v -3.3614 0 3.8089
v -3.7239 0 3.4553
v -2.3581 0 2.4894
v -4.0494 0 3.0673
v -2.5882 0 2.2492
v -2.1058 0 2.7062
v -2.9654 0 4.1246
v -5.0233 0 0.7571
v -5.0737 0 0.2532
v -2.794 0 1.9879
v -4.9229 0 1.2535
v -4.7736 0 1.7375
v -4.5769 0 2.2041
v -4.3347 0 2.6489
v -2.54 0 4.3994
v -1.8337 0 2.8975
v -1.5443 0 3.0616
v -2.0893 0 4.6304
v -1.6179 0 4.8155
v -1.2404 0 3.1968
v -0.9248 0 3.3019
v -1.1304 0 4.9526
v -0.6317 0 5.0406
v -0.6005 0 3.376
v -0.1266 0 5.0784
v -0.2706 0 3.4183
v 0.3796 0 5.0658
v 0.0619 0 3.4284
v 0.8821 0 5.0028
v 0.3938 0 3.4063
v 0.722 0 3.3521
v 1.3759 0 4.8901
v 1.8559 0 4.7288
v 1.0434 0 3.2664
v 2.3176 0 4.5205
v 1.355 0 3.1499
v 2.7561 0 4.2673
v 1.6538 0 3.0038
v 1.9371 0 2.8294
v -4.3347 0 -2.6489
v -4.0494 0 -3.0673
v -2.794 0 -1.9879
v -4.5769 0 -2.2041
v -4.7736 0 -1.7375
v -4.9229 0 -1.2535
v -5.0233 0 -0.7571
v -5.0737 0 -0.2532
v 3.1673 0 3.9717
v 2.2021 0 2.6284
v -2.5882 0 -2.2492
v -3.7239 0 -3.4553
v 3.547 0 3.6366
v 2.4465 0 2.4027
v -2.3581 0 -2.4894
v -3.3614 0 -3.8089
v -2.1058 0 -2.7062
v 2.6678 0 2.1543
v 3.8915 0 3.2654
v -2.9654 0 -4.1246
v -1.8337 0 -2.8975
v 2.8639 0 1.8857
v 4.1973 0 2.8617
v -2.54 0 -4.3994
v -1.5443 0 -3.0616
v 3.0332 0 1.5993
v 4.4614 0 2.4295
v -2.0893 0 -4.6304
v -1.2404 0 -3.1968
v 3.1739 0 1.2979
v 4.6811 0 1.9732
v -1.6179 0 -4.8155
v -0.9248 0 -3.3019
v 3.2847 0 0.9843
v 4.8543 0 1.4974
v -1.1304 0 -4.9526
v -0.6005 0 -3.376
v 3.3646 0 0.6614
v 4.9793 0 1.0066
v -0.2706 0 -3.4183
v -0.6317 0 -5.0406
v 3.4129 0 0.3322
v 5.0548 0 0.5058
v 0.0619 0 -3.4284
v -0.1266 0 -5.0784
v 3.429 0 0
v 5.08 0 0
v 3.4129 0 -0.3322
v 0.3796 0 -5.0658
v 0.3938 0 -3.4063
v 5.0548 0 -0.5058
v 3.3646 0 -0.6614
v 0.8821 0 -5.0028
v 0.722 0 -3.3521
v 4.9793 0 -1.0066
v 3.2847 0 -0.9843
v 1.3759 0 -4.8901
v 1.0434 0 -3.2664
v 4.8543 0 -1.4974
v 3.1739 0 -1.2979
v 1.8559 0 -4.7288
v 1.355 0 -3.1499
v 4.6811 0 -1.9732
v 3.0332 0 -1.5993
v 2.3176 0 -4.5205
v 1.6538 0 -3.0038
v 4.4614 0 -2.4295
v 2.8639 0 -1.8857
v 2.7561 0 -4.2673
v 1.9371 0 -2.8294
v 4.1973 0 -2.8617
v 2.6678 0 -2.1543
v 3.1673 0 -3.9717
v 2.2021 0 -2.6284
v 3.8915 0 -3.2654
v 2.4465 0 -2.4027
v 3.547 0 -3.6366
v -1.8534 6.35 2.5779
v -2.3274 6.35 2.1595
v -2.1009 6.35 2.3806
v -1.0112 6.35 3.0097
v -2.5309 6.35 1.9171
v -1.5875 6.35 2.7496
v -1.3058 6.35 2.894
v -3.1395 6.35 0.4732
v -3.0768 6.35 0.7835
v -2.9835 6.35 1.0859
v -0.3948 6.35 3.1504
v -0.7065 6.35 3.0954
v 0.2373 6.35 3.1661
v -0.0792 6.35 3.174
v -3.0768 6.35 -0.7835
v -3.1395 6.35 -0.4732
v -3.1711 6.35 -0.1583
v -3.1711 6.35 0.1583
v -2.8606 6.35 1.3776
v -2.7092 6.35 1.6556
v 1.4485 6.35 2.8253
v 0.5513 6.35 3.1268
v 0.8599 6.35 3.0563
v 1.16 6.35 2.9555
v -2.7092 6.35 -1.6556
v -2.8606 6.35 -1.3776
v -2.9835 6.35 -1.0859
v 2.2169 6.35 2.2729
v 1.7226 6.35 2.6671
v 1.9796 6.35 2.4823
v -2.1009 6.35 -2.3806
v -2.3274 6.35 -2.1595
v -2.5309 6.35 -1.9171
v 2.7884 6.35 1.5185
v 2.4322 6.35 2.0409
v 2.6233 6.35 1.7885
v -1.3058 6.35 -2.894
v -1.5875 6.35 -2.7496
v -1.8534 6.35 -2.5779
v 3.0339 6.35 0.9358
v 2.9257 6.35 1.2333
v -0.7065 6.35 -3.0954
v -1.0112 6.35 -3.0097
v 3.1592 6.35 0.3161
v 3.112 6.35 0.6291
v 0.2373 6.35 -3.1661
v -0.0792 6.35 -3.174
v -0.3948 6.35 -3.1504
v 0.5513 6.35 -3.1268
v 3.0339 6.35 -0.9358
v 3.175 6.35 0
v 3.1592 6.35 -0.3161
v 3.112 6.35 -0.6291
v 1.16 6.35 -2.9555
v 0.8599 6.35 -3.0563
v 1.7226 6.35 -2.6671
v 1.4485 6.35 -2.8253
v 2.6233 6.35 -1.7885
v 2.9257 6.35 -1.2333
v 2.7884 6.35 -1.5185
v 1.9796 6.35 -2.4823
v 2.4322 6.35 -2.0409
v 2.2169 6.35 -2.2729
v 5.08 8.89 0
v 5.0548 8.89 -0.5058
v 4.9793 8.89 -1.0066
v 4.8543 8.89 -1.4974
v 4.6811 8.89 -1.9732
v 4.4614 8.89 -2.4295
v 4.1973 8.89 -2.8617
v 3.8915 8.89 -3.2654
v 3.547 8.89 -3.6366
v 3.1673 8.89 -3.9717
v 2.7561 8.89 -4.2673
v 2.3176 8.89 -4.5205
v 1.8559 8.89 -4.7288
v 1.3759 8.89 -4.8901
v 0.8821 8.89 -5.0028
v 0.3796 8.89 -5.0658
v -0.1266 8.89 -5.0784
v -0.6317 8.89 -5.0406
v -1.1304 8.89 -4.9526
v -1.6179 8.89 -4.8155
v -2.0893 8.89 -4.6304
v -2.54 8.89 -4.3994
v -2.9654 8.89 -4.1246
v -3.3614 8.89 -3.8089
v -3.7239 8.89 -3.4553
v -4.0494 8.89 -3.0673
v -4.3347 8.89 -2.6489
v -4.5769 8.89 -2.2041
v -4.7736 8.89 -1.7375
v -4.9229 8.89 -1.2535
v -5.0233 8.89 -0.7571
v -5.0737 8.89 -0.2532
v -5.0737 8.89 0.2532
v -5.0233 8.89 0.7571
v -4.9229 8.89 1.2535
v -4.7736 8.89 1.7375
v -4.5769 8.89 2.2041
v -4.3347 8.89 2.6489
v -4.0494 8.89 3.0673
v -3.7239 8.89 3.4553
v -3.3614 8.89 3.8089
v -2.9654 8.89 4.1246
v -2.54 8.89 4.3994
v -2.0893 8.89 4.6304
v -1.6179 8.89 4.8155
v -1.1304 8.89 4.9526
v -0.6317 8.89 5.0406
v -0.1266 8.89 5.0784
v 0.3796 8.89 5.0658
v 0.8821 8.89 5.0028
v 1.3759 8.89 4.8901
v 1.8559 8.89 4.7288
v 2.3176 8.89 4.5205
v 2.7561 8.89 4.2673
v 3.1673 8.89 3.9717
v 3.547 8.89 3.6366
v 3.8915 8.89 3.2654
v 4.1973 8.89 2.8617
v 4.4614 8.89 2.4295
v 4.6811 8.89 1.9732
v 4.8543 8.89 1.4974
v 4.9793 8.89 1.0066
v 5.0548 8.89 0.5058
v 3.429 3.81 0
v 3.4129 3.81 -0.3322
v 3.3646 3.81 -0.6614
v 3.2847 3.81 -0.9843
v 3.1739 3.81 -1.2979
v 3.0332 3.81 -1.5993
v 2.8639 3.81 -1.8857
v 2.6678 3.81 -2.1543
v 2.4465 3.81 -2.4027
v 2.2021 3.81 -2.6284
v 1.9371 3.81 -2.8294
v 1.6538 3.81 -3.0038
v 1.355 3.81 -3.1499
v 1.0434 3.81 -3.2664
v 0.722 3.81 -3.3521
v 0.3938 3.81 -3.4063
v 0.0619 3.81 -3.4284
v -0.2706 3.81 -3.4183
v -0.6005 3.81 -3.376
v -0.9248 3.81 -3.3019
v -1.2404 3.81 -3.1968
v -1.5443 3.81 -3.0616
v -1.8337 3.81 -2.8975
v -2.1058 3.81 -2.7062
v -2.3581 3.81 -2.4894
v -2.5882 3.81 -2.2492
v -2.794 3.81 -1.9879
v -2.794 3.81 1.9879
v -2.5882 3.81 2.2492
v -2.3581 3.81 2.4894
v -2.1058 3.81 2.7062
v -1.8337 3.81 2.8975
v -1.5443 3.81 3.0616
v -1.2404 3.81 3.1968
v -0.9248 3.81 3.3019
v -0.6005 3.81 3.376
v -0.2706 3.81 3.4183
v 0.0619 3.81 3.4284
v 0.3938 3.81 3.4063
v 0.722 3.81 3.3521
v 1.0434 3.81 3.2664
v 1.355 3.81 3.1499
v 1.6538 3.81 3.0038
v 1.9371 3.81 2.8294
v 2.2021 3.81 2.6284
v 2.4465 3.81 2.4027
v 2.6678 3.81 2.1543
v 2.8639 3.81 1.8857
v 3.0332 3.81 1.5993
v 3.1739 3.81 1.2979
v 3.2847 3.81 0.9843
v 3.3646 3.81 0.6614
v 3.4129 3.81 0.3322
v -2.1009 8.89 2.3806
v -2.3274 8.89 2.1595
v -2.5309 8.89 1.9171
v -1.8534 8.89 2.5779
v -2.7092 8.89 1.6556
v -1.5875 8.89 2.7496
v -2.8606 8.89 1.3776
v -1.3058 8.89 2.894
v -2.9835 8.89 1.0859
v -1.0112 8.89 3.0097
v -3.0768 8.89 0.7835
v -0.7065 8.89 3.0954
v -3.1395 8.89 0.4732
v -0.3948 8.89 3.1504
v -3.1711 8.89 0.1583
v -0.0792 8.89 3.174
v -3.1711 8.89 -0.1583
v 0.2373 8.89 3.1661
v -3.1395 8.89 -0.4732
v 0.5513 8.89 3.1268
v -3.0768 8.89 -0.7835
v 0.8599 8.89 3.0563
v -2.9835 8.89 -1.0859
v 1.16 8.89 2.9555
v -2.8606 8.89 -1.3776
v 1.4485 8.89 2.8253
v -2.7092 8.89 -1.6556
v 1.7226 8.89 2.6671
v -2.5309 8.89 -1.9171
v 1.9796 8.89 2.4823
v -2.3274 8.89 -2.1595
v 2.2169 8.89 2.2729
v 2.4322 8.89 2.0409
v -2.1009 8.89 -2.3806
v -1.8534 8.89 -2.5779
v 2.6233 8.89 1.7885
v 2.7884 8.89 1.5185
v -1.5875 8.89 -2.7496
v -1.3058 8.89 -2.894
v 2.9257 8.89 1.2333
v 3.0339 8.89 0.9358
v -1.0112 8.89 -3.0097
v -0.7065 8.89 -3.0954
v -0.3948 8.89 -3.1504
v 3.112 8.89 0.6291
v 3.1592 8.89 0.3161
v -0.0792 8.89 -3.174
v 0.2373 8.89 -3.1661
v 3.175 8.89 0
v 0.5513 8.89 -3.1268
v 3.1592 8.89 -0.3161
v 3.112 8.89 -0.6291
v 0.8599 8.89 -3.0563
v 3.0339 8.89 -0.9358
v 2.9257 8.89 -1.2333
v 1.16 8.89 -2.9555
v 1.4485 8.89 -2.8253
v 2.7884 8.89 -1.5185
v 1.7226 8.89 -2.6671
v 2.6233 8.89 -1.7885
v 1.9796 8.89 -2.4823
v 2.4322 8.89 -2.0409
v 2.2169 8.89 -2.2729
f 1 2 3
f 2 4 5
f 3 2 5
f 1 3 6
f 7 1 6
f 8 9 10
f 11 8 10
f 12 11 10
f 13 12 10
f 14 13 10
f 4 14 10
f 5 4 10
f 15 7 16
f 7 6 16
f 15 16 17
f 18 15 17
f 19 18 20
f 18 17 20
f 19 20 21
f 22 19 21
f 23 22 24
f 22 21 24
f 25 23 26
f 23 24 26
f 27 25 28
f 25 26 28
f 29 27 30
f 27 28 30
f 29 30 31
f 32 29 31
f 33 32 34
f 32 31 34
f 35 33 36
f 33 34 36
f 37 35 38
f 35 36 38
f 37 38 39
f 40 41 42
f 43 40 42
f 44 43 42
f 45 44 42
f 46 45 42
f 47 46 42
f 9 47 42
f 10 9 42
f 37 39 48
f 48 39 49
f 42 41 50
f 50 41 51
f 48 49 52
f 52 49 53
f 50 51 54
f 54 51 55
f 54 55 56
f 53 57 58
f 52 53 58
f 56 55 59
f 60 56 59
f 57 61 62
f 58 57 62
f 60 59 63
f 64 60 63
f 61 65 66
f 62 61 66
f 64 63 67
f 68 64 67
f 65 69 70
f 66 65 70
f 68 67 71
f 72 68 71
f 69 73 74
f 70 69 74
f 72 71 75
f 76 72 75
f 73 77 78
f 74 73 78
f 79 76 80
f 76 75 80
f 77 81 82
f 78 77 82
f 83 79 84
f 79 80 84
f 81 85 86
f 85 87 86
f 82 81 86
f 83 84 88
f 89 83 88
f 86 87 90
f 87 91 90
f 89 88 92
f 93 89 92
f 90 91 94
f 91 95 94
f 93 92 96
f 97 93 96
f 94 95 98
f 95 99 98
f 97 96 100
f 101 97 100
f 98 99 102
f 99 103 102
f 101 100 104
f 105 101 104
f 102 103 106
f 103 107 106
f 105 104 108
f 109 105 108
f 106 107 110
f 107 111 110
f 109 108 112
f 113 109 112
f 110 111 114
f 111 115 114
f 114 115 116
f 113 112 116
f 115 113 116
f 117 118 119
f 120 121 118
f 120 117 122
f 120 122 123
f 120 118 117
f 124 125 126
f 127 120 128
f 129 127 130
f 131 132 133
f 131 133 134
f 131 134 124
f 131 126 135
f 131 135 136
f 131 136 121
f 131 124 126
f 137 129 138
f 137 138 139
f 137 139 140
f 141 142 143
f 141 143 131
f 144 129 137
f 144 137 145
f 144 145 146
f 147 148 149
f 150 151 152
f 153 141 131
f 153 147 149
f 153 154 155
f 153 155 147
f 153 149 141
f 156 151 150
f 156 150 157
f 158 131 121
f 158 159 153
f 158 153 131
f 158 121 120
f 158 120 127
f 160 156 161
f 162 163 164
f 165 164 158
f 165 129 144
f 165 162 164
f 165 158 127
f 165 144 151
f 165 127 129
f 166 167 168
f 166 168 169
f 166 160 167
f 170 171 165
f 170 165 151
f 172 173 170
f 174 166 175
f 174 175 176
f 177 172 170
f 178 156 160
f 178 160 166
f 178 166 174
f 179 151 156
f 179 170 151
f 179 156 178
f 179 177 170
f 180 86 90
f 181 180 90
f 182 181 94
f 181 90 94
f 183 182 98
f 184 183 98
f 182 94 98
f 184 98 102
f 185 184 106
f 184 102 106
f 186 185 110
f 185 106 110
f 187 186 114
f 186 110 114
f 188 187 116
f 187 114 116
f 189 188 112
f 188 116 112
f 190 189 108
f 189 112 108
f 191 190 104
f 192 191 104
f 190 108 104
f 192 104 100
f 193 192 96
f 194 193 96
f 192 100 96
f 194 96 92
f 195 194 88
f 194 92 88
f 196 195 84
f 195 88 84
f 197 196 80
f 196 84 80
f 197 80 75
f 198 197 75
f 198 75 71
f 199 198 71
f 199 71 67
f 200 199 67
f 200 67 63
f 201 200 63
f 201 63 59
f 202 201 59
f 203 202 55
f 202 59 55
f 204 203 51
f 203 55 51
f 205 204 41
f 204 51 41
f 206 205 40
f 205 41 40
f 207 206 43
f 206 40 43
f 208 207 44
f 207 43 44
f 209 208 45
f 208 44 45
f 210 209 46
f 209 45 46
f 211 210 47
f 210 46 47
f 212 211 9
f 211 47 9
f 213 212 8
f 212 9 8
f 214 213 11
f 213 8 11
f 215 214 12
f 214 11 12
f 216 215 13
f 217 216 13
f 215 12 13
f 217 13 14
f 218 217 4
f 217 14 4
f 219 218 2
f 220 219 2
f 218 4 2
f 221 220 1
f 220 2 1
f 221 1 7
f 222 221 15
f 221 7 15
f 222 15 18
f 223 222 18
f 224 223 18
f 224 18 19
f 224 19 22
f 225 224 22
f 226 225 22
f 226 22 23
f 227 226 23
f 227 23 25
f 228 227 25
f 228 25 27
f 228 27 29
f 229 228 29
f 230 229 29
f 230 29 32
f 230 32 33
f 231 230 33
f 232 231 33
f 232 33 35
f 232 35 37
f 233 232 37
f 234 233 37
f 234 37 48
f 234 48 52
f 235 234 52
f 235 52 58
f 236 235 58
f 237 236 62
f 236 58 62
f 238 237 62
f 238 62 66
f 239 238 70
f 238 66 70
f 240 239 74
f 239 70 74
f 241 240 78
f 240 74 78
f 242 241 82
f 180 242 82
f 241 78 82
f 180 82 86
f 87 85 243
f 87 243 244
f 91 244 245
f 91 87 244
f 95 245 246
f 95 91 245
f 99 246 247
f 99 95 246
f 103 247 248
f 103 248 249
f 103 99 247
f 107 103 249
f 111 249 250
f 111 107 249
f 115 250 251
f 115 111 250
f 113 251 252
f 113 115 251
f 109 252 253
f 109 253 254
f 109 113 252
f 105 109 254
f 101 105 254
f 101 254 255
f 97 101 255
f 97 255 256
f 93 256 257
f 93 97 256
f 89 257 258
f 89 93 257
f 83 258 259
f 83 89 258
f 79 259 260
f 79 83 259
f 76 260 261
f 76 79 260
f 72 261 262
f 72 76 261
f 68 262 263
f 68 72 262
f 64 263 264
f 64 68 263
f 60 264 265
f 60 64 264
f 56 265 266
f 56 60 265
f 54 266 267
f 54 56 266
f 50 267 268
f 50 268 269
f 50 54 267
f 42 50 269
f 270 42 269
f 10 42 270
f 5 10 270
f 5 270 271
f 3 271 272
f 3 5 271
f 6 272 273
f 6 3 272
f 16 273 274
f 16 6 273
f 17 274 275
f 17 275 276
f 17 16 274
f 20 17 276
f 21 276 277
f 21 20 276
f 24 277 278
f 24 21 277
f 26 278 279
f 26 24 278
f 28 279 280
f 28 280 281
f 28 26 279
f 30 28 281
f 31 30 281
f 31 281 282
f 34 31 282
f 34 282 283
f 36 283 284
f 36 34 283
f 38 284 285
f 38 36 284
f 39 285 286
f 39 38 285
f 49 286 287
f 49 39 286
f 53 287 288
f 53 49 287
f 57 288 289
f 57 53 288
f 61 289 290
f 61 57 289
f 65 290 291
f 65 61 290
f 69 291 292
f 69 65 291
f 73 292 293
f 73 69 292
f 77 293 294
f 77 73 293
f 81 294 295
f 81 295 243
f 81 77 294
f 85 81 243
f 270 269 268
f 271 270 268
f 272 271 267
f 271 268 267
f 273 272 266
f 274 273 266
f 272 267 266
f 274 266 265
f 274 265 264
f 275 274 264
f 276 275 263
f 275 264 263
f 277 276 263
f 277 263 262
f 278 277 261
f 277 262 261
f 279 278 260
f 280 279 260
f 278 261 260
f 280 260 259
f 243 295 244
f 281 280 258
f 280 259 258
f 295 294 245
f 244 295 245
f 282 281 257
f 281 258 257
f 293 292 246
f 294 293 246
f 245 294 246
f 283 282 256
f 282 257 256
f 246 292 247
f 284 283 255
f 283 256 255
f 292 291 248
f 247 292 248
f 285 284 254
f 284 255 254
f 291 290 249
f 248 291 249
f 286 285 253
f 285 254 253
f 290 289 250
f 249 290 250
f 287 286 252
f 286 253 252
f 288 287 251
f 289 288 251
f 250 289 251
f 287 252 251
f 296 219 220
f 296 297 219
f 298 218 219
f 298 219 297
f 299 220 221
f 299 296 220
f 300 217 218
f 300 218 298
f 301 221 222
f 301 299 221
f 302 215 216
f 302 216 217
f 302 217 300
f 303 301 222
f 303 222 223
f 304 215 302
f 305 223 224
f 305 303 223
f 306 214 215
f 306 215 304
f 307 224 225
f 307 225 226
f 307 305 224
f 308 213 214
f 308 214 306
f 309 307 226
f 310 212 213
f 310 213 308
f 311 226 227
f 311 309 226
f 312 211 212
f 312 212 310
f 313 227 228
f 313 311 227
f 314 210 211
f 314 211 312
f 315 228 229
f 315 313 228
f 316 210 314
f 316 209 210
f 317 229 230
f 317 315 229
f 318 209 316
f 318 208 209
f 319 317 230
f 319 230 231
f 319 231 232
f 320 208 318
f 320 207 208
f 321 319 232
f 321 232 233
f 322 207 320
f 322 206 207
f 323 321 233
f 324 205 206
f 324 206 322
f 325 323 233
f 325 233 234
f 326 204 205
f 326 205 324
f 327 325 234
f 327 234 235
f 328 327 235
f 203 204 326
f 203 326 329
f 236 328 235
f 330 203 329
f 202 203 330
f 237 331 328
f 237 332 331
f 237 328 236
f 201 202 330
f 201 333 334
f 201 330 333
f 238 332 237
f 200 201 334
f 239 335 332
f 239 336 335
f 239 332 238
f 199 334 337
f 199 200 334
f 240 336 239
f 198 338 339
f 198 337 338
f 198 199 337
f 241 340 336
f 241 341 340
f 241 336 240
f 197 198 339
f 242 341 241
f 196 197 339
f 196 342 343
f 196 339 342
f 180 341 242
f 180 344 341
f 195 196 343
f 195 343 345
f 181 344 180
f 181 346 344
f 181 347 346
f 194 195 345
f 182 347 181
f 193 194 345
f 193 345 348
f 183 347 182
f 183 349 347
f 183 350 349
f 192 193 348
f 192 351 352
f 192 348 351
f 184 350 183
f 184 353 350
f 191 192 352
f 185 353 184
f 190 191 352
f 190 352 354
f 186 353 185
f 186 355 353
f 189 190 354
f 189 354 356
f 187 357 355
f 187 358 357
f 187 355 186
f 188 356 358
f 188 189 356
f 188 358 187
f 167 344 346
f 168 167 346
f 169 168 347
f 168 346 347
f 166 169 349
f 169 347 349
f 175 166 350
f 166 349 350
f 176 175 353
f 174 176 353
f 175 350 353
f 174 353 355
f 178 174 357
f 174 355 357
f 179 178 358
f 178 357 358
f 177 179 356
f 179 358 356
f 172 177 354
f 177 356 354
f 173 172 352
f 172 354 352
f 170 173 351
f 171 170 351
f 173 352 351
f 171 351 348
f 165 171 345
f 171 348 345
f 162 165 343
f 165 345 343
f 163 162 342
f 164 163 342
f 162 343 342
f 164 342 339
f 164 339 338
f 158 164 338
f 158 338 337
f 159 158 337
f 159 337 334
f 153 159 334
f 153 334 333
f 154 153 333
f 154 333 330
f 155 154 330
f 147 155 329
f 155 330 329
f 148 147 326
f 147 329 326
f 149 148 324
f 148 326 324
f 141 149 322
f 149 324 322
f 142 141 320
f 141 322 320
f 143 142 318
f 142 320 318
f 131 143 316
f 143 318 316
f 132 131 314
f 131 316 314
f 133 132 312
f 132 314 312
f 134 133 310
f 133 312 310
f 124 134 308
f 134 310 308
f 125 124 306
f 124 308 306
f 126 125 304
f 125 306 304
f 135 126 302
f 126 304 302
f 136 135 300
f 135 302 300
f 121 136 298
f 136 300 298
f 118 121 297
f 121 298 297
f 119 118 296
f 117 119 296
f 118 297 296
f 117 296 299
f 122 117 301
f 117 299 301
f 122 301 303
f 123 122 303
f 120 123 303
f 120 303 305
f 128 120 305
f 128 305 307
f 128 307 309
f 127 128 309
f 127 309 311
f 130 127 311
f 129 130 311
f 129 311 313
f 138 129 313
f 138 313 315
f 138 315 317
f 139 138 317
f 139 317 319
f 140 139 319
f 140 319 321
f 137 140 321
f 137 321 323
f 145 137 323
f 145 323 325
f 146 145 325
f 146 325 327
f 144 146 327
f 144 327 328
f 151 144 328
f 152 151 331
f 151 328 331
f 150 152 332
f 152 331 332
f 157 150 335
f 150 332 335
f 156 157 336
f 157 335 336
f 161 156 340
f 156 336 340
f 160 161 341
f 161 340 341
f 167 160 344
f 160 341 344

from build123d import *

# Parameters (mm, degrees)
SKETCH1_R           = 5.08
BOSS_EXTRUDE1_DEPTH = 8.89
CUT_EXTRUDE1_DEPTH  = 3.81
SKETCH3_R           = 3.175
CUT_EXTRUDE2_DEPTH  = 2.54


with BuildPart() as part:
    # Sketch1 → Boss-Extrude1 (new body)
    with BuildSketch(Plane(origin=(0, 0, 0), x_dir=(1, 0, 0), z_dir=(0, 1, 0))):
        Circle(SKETCH1_R)
    extrude(amount=BOSS_EXTRUDE1_DEPTH)

    # Sketch2 → Cut-Extrude1 (cut)
    with BuildSketch(Plane(origin=(0, 0, 0), x_dir=(1, 0, 0), z_dir=(0, 1, 0))):
        with BuildLine():
            Line((-2.794, 1.987864432), (-2.794, -1.987864432))
            ThreePointArc((-2.794, -1.987864432), (1.043411472, -3.266394572), (3.429, 0))
            ThreePointArc((3.429, 0), (1.043411472, 3.266394572), (-2.794, 1.987864432))
        make_face()
    extrude(amount=CUT_EXTRUDE1_DEPTH, mode=Mode.SUBTRACT)

    # Sketch3 → Cut-Extrude2 (cut)
    with BuildSketch(Plane(origin=(0, 8.89, 0), x_dir=(1, 0, 0), z_dir=(0, 1, 0))):
        Circle(SKETCH3_R)
    extrude(amount=-CUT_EXTRUDE2_DEPTH, mode=Mode.SUBTRACT)


solid = part.part
